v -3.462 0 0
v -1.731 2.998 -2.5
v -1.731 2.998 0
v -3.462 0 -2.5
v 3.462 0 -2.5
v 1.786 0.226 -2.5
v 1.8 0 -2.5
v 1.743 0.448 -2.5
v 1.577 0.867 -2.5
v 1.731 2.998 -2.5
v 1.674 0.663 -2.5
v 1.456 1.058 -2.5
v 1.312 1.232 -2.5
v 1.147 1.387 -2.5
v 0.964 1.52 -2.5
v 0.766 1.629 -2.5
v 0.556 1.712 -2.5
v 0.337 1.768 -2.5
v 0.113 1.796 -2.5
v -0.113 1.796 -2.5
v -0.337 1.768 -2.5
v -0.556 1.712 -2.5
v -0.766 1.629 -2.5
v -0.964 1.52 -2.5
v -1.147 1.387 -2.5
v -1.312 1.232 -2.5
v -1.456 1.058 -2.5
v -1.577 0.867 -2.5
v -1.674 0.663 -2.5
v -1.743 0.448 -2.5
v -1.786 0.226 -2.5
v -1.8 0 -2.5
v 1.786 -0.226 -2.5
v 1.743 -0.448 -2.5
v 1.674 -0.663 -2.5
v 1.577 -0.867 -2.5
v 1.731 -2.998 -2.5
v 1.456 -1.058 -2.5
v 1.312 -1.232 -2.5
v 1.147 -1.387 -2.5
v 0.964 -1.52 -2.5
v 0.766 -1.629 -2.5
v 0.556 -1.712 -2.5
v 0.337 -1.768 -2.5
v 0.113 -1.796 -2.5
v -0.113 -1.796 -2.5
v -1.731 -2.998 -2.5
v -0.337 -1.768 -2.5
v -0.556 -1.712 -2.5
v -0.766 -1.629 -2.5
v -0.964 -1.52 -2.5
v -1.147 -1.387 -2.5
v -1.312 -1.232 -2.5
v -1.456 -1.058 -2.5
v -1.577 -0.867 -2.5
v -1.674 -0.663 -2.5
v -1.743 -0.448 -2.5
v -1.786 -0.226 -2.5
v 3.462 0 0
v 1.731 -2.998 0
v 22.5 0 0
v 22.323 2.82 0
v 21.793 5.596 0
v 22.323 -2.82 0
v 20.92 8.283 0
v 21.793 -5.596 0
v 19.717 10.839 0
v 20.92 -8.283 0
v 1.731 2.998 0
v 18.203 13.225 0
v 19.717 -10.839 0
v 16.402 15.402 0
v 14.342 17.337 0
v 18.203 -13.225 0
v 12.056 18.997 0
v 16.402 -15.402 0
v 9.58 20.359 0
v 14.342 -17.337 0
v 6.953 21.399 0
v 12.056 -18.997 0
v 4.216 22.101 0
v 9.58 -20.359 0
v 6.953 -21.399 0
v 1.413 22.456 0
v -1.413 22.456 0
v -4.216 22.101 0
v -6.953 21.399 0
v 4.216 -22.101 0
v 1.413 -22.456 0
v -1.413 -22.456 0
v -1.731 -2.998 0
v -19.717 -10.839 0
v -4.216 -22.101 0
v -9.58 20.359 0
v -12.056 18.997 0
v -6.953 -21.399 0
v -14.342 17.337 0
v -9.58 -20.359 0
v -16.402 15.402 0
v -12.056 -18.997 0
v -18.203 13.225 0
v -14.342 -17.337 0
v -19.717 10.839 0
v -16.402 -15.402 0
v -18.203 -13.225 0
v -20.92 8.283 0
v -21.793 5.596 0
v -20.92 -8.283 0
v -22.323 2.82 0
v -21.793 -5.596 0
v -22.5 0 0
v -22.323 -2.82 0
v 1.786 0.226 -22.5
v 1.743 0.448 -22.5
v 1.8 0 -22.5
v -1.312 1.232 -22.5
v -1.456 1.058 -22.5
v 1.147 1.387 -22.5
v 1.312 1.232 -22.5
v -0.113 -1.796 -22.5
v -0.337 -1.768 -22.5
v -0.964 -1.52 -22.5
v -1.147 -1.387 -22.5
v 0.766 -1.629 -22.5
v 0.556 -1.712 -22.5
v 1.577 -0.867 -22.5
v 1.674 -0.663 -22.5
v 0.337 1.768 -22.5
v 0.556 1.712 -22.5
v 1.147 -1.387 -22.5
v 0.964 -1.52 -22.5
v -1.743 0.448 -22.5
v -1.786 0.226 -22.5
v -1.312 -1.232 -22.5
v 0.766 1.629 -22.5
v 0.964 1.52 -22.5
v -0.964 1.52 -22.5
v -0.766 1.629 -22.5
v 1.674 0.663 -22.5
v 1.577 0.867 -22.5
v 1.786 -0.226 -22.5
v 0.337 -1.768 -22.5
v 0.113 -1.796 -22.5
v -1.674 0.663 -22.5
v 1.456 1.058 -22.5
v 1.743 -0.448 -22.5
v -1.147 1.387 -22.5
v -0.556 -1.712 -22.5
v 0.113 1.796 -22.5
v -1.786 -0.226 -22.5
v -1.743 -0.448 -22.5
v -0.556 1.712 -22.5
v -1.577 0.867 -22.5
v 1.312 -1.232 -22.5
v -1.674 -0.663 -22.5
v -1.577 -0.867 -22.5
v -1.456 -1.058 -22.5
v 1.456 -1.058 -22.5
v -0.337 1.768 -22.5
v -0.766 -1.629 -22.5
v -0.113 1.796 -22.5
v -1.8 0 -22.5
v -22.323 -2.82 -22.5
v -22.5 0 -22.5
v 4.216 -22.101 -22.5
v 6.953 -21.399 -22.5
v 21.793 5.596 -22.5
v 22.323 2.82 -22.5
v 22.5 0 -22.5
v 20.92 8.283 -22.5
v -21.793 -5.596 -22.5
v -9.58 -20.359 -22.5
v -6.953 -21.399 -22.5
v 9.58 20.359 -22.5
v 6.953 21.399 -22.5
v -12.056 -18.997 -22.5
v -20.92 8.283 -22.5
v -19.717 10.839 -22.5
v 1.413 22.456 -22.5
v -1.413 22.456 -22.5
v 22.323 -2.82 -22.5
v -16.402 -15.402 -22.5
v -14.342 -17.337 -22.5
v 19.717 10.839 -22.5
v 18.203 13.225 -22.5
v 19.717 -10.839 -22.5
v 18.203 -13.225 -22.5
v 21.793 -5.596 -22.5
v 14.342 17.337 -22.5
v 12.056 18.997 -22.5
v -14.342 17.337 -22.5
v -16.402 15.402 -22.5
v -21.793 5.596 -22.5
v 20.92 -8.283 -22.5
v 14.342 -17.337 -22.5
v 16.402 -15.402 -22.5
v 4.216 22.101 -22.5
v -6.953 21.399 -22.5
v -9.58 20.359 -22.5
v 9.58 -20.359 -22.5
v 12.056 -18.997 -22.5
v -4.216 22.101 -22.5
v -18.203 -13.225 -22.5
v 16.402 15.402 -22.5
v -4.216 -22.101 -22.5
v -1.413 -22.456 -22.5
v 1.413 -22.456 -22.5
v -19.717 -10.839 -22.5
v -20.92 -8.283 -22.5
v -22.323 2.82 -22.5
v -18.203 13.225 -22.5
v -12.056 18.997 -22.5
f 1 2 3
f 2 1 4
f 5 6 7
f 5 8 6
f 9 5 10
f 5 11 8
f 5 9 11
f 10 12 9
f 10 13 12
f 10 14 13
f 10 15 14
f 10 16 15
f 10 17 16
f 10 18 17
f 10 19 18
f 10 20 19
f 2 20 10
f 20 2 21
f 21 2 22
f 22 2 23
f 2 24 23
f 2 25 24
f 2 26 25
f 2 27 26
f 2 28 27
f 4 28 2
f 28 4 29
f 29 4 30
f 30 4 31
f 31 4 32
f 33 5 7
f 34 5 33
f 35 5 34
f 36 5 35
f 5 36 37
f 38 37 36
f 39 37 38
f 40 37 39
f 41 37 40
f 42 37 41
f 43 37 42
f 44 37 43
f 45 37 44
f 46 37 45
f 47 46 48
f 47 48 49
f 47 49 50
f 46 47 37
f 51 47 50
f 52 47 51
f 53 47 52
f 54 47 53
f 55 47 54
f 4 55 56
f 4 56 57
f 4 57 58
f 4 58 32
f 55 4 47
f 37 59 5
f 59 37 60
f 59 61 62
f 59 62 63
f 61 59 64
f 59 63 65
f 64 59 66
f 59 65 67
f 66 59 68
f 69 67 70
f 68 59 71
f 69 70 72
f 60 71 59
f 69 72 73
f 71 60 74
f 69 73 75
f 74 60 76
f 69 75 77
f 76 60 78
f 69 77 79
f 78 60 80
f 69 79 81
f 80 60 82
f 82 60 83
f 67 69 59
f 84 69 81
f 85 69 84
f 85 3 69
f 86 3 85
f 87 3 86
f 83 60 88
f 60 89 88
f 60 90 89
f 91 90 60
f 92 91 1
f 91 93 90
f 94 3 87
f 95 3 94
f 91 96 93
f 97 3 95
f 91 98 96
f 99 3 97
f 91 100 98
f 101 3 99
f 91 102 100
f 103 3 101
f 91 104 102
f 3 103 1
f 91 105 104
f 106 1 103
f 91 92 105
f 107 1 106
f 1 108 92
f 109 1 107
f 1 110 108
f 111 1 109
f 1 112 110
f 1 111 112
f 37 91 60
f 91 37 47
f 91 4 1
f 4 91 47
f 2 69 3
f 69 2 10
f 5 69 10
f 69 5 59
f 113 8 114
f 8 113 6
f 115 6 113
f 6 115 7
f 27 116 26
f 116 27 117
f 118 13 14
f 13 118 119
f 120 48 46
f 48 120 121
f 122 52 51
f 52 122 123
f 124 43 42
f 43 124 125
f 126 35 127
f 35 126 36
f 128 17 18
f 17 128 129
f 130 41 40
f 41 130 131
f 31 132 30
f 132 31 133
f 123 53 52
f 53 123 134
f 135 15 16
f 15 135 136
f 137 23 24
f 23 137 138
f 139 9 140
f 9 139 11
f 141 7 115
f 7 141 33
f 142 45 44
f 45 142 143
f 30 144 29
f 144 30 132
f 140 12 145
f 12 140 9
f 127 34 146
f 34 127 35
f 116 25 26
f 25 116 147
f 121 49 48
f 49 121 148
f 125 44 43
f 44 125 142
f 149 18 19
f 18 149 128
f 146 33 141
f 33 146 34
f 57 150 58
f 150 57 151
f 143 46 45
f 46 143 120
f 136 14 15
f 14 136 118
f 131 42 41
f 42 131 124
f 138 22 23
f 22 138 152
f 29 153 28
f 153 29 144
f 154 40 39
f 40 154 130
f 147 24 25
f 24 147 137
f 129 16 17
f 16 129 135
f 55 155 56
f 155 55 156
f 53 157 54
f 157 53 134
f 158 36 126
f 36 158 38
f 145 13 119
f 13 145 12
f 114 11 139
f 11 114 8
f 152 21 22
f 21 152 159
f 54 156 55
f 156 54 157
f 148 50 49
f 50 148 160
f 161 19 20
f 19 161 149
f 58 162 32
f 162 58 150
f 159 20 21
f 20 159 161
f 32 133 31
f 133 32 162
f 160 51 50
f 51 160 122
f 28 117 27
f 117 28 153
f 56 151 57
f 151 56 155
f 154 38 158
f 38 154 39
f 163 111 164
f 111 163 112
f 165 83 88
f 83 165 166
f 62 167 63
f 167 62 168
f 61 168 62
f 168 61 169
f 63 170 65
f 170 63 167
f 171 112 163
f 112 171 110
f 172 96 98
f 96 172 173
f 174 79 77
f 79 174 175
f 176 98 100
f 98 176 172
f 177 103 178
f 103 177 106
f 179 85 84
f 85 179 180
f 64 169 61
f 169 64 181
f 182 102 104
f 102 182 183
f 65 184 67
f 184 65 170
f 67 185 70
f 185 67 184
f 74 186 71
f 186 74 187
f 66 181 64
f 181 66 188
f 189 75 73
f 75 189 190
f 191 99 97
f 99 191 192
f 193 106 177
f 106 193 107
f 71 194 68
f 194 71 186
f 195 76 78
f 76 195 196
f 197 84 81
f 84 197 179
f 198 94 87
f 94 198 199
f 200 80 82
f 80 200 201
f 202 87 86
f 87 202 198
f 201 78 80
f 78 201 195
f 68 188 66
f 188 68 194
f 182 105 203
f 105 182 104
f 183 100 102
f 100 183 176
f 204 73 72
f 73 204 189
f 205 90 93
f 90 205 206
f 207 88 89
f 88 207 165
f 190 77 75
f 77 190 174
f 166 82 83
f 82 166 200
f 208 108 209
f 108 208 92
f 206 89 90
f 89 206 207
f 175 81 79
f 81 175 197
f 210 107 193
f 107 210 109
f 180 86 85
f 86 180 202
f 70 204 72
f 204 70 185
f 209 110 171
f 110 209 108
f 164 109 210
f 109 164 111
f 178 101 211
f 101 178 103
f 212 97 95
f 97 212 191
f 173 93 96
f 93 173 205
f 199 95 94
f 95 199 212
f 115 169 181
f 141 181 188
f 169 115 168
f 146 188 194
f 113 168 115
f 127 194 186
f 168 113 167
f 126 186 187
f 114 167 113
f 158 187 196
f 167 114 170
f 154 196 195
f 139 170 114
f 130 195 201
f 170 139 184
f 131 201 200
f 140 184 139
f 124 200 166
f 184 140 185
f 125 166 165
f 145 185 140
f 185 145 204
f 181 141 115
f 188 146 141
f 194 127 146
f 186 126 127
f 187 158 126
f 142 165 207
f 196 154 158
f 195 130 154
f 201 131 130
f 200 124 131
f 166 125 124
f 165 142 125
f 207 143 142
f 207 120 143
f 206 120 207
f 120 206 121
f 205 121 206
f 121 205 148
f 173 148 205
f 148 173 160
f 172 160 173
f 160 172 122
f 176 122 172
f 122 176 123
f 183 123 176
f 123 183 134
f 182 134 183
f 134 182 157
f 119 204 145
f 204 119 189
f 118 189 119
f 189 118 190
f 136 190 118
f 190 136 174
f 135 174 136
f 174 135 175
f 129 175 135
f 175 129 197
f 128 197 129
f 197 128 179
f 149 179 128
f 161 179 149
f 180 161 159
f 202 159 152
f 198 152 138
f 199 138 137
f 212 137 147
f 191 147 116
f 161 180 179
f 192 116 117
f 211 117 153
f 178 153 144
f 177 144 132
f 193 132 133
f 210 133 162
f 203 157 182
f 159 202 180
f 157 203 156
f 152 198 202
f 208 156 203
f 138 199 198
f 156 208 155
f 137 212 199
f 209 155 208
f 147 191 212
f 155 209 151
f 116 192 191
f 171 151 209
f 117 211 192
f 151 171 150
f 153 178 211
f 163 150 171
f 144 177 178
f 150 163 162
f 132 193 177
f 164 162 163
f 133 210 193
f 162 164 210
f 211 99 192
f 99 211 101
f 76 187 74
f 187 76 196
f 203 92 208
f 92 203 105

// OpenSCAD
$fn = 50;

difference() {
	union() {
		translate(v = [0, 0, -22.5]) {
			cylinder(h = 22.5, r = 22.5);
		}
	}
	union() {
		translate(v = [0, 0, 0]) {
			rotate(a = [0, 0, 0]) {
				difference() {
					union() {
						translate(v = [0, 0, -2.5]) {
							linear_extrude(height = 2.5) {
								polygon(points = [[3.4619999999999997, 0.0], [1.7310000000000003, 2.9981799479017264], [-1.7309999999999992, 2.9981799479017264], [-3.4619999999999997, 4.2397272186481365e-16], [-1.7310000000000014, -2.998179947901726], [1.7309999999999977, -2.9981799479017277]]);
							}
						}
					}
					union();
				}
			}
		}
		#translate(v = [0, 0, -100.0]) {
			cylinder(h = 200, r = 1.8);
		}
	}
}
